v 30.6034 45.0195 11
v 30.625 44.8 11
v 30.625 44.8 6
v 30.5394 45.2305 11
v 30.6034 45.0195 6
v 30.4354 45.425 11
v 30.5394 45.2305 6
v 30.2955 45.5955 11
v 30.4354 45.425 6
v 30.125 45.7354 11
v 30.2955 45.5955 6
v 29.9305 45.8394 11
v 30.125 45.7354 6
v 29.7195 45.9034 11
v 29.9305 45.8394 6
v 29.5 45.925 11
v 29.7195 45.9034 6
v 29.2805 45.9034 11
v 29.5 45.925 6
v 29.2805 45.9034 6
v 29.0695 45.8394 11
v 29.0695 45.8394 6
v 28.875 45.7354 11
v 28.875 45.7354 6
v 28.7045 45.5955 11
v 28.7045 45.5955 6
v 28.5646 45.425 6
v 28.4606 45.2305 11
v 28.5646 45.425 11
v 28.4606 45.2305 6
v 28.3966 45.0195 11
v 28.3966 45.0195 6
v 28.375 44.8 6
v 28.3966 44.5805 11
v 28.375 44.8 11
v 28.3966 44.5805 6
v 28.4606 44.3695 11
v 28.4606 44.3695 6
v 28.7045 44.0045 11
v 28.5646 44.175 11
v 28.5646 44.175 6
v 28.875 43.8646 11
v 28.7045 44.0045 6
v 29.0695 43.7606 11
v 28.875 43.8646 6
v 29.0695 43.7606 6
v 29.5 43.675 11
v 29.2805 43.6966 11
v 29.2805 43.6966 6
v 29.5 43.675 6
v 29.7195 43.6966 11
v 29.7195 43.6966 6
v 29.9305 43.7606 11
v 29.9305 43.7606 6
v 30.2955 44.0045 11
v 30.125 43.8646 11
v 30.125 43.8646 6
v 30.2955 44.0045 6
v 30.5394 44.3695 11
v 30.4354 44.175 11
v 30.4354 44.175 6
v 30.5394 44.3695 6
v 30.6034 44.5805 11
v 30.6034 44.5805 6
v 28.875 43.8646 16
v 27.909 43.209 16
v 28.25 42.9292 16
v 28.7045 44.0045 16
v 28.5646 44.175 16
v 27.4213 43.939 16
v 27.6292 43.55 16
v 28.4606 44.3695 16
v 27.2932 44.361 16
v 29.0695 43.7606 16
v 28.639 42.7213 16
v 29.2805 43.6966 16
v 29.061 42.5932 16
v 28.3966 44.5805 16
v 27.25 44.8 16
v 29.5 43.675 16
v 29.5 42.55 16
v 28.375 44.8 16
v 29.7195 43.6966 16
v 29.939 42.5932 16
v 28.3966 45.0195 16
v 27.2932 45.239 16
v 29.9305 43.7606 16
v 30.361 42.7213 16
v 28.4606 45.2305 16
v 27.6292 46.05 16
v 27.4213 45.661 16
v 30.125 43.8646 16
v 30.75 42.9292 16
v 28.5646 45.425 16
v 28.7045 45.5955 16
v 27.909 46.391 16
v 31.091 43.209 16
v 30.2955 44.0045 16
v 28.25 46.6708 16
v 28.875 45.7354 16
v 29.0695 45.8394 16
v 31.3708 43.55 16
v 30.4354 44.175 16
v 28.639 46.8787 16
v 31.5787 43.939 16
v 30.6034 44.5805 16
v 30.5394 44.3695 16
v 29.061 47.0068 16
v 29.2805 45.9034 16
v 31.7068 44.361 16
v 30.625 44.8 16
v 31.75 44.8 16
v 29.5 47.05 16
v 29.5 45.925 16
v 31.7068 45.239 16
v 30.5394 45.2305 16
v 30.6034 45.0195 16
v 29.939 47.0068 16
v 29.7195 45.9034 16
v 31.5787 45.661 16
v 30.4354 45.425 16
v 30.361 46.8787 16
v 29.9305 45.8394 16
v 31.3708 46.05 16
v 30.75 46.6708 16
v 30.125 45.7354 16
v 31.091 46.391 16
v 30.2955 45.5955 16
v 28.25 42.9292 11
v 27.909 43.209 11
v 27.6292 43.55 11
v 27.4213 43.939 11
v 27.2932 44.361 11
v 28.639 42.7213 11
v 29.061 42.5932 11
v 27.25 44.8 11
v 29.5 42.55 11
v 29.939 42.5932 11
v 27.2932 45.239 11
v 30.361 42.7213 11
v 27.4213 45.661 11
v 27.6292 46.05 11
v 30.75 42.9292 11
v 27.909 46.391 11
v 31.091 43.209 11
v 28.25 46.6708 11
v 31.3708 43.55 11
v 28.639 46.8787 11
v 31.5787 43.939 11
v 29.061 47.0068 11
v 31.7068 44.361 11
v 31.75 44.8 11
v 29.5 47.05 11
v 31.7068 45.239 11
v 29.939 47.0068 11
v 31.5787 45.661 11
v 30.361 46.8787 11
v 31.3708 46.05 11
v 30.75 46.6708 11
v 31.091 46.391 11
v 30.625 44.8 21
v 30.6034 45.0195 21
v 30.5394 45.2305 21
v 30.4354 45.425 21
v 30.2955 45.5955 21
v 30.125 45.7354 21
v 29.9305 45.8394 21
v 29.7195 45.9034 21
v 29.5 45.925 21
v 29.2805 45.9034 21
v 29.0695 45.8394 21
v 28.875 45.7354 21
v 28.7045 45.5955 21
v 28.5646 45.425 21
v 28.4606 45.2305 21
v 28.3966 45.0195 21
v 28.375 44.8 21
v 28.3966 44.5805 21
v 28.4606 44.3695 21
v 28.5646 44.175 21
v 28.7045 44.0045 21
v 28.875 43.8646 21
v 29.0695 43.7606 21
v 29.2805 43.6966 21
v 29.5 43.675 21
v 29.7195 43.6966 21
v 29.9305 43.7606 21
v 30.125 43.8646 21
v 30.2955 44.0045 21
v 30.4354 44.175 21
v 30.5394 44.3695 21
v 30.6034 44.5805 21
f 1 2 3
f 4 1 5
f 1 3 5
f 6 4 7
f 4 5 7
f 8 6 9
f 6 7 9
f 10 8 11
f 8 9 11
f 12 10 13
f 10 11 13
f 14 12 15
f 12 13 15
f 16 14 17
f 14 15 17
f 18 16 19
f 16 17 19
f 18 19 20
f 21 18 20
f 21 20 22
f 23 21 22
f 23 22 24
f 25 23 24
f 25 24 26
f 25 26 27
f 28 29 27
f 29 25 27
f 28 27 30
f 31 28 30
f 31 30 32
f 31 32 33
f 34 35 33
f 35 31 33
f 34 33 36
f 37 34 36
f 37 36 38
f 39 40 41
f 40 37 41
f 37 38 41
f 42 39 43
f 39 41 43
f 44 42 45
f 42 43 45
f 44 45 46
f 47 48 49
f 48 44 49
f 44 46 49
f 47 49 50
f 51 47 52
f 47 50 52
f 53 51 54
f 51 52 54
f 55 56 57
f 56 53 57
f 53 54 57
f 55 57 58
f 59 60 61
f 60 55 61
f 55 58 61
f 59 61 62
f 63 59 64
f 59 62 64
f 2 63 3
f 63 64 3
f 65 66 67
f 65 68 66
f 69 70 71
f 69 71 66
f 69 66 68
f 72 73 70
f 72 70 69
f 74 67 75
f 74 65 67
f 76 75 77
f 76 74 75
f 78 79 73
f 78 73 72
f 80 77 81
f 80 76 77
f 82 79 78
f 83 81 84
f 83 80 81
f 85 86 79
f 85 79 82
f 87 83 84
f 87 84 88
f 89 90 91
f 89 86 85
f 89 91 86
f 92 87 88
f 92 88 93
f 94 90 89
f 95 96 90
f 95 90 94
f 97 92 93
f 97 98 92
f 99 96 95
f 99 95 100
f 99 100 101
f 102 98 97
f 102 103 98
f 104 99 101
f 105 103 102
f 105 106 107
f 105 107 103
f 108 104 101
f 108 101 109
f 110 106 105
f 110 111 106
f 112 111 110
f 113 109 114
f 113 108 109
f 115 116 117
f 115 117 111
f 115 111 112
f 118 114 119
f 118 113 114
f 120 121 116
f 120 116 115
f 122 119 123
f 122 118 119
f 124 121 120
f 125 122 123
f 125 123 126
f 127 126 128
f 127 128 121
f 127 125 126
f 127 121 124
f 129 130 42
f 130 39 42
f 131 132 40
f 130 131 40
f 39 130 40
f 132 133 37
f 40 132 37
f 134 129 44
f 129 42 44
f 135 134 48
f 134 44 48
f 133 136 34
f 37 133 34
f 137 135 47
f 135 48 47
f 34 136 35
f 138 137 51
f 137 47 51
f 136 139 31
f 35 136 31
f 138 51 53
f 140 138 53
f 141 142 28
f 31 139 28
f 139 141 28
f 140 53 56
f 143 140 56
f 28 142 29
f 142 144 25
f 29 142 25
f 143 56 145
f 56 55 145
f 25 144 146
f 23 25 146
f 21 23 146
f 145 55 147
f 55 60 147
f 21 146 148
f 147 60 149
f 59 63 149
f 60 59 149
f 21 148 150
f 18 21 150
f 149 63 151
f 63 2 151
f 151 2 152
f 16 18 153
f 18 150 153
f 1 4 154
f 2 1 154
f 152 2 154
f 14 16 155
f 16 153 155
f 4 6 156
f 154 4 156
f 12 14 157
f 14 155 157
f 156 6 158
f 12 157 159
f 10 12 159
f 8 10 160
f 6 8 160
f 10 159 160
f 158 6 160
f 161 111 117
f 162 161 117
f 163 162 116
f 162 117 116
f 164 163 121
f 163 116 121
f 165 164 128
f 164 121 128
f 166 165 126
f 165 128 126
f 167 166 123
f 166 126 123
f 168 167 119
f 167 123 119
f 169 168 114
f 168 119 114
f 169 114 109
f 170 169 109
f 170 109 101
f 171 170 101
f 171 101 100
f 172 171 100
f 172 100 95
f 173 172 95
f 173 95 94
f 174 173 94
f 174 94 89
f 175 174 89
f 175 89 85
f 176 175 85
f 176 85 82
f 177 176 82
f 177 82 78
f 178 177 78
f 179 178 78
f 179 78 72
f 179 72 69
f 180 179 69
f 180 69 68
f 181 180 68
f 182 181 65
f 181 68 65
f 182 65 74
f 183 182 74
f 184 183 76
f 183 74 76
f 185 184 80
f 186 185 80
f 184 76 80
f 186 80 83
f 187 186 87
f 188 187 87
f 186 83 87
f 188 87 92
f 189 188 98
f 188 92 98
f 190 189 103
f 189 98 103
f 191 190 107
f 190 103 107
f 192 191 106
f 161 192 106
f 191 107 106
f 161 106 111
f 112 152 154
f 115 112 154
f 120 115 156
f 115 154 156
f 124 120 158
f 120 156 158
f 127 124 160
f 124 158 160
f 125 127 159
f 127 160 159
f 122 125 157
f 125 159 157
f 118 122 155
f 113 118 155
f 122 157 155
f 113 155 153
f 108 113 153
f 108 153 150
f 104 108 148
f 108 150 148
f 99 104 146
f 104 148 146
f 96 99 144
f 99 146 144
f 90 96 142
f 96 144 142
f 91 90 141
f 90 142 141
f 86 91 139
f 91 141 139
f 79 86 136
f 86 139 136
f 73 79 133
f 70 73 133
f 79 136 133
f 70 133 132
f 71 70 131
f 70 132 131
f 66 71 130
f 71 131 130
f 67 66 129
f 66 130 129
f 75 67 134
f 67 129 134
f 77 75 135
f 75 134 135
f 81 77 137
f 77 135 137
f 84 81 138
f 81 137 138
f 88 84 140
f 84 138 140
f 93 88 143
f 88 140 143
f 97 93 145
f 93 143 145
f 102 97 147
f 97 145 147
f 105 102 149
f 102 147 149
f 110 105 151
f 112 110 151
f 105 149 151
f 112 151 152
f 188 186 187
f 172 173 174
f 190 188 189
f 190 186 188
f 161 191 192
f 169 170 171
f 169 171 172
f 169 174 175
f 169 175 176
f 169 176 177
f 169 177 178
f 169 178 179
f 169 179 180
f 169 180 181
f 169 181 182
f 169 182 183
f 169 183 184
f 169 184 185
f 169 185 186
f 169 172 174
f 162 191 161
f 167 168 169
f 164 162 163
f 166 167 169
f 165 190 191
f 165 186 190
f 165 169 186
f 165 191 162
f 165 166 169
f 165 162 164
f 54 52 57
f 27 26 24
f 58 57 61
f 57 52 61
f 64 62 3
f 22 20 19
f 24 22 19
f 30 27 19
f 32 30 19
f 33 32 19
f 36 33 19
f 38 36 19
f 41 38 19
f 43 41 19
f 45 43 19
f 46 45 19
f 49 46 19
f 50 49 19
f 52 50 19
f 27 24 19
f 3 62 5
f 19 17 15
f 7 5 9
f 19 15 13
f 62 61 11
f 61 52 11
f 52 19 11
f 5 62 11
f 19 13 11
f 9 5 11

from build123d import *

# Parameters (mm, degrees)
CYLINDER002_R        = 4.5
CYLINDER002_DEPTH    = 10
CYLINDER003_R        = 2.25
CYLINDER003_DEPTH    = 30
CLONE014_SCALE_SCALE = 0.5


with BuildPart() as cylinder002:
    # Cylinder002 → Cylinder002 (new body)
    with BuildSketch(Plane(origin=(0, 10, 5), x_dir=(1, 0, 0), z_dir=(0, 0, 1))):
        Circle(CYLINDER002_R)
    extrude(amount=CYLINDER002_DEPTH)


with BuildPart() as clone014:
    # Cylinder003 → Cylinder003 (new body)
    with BuildSketch(Plane(origin=(0, 10, -5), x_dir=(1, 0, 0), z_dir=(0, 0, 1))):
        Circle(CYLINDER003_R)
    extrude(amount=CYLINDER003_DEPTH)

    # Fusion002: union Cylinder002
    add(cylinder002.part)


with BuildPart() as clone014_1:
    # Clone014 scale: moved
    add(clone014.part.scale(CLONE014_SCALE_SCALE))


with BuildPart() as clone014_2:
    # Clone014 placement: moved
    add(clone014_1.part.moved(Location((29.5, 39.8, 8.5))))


solid = clone014_2.part
